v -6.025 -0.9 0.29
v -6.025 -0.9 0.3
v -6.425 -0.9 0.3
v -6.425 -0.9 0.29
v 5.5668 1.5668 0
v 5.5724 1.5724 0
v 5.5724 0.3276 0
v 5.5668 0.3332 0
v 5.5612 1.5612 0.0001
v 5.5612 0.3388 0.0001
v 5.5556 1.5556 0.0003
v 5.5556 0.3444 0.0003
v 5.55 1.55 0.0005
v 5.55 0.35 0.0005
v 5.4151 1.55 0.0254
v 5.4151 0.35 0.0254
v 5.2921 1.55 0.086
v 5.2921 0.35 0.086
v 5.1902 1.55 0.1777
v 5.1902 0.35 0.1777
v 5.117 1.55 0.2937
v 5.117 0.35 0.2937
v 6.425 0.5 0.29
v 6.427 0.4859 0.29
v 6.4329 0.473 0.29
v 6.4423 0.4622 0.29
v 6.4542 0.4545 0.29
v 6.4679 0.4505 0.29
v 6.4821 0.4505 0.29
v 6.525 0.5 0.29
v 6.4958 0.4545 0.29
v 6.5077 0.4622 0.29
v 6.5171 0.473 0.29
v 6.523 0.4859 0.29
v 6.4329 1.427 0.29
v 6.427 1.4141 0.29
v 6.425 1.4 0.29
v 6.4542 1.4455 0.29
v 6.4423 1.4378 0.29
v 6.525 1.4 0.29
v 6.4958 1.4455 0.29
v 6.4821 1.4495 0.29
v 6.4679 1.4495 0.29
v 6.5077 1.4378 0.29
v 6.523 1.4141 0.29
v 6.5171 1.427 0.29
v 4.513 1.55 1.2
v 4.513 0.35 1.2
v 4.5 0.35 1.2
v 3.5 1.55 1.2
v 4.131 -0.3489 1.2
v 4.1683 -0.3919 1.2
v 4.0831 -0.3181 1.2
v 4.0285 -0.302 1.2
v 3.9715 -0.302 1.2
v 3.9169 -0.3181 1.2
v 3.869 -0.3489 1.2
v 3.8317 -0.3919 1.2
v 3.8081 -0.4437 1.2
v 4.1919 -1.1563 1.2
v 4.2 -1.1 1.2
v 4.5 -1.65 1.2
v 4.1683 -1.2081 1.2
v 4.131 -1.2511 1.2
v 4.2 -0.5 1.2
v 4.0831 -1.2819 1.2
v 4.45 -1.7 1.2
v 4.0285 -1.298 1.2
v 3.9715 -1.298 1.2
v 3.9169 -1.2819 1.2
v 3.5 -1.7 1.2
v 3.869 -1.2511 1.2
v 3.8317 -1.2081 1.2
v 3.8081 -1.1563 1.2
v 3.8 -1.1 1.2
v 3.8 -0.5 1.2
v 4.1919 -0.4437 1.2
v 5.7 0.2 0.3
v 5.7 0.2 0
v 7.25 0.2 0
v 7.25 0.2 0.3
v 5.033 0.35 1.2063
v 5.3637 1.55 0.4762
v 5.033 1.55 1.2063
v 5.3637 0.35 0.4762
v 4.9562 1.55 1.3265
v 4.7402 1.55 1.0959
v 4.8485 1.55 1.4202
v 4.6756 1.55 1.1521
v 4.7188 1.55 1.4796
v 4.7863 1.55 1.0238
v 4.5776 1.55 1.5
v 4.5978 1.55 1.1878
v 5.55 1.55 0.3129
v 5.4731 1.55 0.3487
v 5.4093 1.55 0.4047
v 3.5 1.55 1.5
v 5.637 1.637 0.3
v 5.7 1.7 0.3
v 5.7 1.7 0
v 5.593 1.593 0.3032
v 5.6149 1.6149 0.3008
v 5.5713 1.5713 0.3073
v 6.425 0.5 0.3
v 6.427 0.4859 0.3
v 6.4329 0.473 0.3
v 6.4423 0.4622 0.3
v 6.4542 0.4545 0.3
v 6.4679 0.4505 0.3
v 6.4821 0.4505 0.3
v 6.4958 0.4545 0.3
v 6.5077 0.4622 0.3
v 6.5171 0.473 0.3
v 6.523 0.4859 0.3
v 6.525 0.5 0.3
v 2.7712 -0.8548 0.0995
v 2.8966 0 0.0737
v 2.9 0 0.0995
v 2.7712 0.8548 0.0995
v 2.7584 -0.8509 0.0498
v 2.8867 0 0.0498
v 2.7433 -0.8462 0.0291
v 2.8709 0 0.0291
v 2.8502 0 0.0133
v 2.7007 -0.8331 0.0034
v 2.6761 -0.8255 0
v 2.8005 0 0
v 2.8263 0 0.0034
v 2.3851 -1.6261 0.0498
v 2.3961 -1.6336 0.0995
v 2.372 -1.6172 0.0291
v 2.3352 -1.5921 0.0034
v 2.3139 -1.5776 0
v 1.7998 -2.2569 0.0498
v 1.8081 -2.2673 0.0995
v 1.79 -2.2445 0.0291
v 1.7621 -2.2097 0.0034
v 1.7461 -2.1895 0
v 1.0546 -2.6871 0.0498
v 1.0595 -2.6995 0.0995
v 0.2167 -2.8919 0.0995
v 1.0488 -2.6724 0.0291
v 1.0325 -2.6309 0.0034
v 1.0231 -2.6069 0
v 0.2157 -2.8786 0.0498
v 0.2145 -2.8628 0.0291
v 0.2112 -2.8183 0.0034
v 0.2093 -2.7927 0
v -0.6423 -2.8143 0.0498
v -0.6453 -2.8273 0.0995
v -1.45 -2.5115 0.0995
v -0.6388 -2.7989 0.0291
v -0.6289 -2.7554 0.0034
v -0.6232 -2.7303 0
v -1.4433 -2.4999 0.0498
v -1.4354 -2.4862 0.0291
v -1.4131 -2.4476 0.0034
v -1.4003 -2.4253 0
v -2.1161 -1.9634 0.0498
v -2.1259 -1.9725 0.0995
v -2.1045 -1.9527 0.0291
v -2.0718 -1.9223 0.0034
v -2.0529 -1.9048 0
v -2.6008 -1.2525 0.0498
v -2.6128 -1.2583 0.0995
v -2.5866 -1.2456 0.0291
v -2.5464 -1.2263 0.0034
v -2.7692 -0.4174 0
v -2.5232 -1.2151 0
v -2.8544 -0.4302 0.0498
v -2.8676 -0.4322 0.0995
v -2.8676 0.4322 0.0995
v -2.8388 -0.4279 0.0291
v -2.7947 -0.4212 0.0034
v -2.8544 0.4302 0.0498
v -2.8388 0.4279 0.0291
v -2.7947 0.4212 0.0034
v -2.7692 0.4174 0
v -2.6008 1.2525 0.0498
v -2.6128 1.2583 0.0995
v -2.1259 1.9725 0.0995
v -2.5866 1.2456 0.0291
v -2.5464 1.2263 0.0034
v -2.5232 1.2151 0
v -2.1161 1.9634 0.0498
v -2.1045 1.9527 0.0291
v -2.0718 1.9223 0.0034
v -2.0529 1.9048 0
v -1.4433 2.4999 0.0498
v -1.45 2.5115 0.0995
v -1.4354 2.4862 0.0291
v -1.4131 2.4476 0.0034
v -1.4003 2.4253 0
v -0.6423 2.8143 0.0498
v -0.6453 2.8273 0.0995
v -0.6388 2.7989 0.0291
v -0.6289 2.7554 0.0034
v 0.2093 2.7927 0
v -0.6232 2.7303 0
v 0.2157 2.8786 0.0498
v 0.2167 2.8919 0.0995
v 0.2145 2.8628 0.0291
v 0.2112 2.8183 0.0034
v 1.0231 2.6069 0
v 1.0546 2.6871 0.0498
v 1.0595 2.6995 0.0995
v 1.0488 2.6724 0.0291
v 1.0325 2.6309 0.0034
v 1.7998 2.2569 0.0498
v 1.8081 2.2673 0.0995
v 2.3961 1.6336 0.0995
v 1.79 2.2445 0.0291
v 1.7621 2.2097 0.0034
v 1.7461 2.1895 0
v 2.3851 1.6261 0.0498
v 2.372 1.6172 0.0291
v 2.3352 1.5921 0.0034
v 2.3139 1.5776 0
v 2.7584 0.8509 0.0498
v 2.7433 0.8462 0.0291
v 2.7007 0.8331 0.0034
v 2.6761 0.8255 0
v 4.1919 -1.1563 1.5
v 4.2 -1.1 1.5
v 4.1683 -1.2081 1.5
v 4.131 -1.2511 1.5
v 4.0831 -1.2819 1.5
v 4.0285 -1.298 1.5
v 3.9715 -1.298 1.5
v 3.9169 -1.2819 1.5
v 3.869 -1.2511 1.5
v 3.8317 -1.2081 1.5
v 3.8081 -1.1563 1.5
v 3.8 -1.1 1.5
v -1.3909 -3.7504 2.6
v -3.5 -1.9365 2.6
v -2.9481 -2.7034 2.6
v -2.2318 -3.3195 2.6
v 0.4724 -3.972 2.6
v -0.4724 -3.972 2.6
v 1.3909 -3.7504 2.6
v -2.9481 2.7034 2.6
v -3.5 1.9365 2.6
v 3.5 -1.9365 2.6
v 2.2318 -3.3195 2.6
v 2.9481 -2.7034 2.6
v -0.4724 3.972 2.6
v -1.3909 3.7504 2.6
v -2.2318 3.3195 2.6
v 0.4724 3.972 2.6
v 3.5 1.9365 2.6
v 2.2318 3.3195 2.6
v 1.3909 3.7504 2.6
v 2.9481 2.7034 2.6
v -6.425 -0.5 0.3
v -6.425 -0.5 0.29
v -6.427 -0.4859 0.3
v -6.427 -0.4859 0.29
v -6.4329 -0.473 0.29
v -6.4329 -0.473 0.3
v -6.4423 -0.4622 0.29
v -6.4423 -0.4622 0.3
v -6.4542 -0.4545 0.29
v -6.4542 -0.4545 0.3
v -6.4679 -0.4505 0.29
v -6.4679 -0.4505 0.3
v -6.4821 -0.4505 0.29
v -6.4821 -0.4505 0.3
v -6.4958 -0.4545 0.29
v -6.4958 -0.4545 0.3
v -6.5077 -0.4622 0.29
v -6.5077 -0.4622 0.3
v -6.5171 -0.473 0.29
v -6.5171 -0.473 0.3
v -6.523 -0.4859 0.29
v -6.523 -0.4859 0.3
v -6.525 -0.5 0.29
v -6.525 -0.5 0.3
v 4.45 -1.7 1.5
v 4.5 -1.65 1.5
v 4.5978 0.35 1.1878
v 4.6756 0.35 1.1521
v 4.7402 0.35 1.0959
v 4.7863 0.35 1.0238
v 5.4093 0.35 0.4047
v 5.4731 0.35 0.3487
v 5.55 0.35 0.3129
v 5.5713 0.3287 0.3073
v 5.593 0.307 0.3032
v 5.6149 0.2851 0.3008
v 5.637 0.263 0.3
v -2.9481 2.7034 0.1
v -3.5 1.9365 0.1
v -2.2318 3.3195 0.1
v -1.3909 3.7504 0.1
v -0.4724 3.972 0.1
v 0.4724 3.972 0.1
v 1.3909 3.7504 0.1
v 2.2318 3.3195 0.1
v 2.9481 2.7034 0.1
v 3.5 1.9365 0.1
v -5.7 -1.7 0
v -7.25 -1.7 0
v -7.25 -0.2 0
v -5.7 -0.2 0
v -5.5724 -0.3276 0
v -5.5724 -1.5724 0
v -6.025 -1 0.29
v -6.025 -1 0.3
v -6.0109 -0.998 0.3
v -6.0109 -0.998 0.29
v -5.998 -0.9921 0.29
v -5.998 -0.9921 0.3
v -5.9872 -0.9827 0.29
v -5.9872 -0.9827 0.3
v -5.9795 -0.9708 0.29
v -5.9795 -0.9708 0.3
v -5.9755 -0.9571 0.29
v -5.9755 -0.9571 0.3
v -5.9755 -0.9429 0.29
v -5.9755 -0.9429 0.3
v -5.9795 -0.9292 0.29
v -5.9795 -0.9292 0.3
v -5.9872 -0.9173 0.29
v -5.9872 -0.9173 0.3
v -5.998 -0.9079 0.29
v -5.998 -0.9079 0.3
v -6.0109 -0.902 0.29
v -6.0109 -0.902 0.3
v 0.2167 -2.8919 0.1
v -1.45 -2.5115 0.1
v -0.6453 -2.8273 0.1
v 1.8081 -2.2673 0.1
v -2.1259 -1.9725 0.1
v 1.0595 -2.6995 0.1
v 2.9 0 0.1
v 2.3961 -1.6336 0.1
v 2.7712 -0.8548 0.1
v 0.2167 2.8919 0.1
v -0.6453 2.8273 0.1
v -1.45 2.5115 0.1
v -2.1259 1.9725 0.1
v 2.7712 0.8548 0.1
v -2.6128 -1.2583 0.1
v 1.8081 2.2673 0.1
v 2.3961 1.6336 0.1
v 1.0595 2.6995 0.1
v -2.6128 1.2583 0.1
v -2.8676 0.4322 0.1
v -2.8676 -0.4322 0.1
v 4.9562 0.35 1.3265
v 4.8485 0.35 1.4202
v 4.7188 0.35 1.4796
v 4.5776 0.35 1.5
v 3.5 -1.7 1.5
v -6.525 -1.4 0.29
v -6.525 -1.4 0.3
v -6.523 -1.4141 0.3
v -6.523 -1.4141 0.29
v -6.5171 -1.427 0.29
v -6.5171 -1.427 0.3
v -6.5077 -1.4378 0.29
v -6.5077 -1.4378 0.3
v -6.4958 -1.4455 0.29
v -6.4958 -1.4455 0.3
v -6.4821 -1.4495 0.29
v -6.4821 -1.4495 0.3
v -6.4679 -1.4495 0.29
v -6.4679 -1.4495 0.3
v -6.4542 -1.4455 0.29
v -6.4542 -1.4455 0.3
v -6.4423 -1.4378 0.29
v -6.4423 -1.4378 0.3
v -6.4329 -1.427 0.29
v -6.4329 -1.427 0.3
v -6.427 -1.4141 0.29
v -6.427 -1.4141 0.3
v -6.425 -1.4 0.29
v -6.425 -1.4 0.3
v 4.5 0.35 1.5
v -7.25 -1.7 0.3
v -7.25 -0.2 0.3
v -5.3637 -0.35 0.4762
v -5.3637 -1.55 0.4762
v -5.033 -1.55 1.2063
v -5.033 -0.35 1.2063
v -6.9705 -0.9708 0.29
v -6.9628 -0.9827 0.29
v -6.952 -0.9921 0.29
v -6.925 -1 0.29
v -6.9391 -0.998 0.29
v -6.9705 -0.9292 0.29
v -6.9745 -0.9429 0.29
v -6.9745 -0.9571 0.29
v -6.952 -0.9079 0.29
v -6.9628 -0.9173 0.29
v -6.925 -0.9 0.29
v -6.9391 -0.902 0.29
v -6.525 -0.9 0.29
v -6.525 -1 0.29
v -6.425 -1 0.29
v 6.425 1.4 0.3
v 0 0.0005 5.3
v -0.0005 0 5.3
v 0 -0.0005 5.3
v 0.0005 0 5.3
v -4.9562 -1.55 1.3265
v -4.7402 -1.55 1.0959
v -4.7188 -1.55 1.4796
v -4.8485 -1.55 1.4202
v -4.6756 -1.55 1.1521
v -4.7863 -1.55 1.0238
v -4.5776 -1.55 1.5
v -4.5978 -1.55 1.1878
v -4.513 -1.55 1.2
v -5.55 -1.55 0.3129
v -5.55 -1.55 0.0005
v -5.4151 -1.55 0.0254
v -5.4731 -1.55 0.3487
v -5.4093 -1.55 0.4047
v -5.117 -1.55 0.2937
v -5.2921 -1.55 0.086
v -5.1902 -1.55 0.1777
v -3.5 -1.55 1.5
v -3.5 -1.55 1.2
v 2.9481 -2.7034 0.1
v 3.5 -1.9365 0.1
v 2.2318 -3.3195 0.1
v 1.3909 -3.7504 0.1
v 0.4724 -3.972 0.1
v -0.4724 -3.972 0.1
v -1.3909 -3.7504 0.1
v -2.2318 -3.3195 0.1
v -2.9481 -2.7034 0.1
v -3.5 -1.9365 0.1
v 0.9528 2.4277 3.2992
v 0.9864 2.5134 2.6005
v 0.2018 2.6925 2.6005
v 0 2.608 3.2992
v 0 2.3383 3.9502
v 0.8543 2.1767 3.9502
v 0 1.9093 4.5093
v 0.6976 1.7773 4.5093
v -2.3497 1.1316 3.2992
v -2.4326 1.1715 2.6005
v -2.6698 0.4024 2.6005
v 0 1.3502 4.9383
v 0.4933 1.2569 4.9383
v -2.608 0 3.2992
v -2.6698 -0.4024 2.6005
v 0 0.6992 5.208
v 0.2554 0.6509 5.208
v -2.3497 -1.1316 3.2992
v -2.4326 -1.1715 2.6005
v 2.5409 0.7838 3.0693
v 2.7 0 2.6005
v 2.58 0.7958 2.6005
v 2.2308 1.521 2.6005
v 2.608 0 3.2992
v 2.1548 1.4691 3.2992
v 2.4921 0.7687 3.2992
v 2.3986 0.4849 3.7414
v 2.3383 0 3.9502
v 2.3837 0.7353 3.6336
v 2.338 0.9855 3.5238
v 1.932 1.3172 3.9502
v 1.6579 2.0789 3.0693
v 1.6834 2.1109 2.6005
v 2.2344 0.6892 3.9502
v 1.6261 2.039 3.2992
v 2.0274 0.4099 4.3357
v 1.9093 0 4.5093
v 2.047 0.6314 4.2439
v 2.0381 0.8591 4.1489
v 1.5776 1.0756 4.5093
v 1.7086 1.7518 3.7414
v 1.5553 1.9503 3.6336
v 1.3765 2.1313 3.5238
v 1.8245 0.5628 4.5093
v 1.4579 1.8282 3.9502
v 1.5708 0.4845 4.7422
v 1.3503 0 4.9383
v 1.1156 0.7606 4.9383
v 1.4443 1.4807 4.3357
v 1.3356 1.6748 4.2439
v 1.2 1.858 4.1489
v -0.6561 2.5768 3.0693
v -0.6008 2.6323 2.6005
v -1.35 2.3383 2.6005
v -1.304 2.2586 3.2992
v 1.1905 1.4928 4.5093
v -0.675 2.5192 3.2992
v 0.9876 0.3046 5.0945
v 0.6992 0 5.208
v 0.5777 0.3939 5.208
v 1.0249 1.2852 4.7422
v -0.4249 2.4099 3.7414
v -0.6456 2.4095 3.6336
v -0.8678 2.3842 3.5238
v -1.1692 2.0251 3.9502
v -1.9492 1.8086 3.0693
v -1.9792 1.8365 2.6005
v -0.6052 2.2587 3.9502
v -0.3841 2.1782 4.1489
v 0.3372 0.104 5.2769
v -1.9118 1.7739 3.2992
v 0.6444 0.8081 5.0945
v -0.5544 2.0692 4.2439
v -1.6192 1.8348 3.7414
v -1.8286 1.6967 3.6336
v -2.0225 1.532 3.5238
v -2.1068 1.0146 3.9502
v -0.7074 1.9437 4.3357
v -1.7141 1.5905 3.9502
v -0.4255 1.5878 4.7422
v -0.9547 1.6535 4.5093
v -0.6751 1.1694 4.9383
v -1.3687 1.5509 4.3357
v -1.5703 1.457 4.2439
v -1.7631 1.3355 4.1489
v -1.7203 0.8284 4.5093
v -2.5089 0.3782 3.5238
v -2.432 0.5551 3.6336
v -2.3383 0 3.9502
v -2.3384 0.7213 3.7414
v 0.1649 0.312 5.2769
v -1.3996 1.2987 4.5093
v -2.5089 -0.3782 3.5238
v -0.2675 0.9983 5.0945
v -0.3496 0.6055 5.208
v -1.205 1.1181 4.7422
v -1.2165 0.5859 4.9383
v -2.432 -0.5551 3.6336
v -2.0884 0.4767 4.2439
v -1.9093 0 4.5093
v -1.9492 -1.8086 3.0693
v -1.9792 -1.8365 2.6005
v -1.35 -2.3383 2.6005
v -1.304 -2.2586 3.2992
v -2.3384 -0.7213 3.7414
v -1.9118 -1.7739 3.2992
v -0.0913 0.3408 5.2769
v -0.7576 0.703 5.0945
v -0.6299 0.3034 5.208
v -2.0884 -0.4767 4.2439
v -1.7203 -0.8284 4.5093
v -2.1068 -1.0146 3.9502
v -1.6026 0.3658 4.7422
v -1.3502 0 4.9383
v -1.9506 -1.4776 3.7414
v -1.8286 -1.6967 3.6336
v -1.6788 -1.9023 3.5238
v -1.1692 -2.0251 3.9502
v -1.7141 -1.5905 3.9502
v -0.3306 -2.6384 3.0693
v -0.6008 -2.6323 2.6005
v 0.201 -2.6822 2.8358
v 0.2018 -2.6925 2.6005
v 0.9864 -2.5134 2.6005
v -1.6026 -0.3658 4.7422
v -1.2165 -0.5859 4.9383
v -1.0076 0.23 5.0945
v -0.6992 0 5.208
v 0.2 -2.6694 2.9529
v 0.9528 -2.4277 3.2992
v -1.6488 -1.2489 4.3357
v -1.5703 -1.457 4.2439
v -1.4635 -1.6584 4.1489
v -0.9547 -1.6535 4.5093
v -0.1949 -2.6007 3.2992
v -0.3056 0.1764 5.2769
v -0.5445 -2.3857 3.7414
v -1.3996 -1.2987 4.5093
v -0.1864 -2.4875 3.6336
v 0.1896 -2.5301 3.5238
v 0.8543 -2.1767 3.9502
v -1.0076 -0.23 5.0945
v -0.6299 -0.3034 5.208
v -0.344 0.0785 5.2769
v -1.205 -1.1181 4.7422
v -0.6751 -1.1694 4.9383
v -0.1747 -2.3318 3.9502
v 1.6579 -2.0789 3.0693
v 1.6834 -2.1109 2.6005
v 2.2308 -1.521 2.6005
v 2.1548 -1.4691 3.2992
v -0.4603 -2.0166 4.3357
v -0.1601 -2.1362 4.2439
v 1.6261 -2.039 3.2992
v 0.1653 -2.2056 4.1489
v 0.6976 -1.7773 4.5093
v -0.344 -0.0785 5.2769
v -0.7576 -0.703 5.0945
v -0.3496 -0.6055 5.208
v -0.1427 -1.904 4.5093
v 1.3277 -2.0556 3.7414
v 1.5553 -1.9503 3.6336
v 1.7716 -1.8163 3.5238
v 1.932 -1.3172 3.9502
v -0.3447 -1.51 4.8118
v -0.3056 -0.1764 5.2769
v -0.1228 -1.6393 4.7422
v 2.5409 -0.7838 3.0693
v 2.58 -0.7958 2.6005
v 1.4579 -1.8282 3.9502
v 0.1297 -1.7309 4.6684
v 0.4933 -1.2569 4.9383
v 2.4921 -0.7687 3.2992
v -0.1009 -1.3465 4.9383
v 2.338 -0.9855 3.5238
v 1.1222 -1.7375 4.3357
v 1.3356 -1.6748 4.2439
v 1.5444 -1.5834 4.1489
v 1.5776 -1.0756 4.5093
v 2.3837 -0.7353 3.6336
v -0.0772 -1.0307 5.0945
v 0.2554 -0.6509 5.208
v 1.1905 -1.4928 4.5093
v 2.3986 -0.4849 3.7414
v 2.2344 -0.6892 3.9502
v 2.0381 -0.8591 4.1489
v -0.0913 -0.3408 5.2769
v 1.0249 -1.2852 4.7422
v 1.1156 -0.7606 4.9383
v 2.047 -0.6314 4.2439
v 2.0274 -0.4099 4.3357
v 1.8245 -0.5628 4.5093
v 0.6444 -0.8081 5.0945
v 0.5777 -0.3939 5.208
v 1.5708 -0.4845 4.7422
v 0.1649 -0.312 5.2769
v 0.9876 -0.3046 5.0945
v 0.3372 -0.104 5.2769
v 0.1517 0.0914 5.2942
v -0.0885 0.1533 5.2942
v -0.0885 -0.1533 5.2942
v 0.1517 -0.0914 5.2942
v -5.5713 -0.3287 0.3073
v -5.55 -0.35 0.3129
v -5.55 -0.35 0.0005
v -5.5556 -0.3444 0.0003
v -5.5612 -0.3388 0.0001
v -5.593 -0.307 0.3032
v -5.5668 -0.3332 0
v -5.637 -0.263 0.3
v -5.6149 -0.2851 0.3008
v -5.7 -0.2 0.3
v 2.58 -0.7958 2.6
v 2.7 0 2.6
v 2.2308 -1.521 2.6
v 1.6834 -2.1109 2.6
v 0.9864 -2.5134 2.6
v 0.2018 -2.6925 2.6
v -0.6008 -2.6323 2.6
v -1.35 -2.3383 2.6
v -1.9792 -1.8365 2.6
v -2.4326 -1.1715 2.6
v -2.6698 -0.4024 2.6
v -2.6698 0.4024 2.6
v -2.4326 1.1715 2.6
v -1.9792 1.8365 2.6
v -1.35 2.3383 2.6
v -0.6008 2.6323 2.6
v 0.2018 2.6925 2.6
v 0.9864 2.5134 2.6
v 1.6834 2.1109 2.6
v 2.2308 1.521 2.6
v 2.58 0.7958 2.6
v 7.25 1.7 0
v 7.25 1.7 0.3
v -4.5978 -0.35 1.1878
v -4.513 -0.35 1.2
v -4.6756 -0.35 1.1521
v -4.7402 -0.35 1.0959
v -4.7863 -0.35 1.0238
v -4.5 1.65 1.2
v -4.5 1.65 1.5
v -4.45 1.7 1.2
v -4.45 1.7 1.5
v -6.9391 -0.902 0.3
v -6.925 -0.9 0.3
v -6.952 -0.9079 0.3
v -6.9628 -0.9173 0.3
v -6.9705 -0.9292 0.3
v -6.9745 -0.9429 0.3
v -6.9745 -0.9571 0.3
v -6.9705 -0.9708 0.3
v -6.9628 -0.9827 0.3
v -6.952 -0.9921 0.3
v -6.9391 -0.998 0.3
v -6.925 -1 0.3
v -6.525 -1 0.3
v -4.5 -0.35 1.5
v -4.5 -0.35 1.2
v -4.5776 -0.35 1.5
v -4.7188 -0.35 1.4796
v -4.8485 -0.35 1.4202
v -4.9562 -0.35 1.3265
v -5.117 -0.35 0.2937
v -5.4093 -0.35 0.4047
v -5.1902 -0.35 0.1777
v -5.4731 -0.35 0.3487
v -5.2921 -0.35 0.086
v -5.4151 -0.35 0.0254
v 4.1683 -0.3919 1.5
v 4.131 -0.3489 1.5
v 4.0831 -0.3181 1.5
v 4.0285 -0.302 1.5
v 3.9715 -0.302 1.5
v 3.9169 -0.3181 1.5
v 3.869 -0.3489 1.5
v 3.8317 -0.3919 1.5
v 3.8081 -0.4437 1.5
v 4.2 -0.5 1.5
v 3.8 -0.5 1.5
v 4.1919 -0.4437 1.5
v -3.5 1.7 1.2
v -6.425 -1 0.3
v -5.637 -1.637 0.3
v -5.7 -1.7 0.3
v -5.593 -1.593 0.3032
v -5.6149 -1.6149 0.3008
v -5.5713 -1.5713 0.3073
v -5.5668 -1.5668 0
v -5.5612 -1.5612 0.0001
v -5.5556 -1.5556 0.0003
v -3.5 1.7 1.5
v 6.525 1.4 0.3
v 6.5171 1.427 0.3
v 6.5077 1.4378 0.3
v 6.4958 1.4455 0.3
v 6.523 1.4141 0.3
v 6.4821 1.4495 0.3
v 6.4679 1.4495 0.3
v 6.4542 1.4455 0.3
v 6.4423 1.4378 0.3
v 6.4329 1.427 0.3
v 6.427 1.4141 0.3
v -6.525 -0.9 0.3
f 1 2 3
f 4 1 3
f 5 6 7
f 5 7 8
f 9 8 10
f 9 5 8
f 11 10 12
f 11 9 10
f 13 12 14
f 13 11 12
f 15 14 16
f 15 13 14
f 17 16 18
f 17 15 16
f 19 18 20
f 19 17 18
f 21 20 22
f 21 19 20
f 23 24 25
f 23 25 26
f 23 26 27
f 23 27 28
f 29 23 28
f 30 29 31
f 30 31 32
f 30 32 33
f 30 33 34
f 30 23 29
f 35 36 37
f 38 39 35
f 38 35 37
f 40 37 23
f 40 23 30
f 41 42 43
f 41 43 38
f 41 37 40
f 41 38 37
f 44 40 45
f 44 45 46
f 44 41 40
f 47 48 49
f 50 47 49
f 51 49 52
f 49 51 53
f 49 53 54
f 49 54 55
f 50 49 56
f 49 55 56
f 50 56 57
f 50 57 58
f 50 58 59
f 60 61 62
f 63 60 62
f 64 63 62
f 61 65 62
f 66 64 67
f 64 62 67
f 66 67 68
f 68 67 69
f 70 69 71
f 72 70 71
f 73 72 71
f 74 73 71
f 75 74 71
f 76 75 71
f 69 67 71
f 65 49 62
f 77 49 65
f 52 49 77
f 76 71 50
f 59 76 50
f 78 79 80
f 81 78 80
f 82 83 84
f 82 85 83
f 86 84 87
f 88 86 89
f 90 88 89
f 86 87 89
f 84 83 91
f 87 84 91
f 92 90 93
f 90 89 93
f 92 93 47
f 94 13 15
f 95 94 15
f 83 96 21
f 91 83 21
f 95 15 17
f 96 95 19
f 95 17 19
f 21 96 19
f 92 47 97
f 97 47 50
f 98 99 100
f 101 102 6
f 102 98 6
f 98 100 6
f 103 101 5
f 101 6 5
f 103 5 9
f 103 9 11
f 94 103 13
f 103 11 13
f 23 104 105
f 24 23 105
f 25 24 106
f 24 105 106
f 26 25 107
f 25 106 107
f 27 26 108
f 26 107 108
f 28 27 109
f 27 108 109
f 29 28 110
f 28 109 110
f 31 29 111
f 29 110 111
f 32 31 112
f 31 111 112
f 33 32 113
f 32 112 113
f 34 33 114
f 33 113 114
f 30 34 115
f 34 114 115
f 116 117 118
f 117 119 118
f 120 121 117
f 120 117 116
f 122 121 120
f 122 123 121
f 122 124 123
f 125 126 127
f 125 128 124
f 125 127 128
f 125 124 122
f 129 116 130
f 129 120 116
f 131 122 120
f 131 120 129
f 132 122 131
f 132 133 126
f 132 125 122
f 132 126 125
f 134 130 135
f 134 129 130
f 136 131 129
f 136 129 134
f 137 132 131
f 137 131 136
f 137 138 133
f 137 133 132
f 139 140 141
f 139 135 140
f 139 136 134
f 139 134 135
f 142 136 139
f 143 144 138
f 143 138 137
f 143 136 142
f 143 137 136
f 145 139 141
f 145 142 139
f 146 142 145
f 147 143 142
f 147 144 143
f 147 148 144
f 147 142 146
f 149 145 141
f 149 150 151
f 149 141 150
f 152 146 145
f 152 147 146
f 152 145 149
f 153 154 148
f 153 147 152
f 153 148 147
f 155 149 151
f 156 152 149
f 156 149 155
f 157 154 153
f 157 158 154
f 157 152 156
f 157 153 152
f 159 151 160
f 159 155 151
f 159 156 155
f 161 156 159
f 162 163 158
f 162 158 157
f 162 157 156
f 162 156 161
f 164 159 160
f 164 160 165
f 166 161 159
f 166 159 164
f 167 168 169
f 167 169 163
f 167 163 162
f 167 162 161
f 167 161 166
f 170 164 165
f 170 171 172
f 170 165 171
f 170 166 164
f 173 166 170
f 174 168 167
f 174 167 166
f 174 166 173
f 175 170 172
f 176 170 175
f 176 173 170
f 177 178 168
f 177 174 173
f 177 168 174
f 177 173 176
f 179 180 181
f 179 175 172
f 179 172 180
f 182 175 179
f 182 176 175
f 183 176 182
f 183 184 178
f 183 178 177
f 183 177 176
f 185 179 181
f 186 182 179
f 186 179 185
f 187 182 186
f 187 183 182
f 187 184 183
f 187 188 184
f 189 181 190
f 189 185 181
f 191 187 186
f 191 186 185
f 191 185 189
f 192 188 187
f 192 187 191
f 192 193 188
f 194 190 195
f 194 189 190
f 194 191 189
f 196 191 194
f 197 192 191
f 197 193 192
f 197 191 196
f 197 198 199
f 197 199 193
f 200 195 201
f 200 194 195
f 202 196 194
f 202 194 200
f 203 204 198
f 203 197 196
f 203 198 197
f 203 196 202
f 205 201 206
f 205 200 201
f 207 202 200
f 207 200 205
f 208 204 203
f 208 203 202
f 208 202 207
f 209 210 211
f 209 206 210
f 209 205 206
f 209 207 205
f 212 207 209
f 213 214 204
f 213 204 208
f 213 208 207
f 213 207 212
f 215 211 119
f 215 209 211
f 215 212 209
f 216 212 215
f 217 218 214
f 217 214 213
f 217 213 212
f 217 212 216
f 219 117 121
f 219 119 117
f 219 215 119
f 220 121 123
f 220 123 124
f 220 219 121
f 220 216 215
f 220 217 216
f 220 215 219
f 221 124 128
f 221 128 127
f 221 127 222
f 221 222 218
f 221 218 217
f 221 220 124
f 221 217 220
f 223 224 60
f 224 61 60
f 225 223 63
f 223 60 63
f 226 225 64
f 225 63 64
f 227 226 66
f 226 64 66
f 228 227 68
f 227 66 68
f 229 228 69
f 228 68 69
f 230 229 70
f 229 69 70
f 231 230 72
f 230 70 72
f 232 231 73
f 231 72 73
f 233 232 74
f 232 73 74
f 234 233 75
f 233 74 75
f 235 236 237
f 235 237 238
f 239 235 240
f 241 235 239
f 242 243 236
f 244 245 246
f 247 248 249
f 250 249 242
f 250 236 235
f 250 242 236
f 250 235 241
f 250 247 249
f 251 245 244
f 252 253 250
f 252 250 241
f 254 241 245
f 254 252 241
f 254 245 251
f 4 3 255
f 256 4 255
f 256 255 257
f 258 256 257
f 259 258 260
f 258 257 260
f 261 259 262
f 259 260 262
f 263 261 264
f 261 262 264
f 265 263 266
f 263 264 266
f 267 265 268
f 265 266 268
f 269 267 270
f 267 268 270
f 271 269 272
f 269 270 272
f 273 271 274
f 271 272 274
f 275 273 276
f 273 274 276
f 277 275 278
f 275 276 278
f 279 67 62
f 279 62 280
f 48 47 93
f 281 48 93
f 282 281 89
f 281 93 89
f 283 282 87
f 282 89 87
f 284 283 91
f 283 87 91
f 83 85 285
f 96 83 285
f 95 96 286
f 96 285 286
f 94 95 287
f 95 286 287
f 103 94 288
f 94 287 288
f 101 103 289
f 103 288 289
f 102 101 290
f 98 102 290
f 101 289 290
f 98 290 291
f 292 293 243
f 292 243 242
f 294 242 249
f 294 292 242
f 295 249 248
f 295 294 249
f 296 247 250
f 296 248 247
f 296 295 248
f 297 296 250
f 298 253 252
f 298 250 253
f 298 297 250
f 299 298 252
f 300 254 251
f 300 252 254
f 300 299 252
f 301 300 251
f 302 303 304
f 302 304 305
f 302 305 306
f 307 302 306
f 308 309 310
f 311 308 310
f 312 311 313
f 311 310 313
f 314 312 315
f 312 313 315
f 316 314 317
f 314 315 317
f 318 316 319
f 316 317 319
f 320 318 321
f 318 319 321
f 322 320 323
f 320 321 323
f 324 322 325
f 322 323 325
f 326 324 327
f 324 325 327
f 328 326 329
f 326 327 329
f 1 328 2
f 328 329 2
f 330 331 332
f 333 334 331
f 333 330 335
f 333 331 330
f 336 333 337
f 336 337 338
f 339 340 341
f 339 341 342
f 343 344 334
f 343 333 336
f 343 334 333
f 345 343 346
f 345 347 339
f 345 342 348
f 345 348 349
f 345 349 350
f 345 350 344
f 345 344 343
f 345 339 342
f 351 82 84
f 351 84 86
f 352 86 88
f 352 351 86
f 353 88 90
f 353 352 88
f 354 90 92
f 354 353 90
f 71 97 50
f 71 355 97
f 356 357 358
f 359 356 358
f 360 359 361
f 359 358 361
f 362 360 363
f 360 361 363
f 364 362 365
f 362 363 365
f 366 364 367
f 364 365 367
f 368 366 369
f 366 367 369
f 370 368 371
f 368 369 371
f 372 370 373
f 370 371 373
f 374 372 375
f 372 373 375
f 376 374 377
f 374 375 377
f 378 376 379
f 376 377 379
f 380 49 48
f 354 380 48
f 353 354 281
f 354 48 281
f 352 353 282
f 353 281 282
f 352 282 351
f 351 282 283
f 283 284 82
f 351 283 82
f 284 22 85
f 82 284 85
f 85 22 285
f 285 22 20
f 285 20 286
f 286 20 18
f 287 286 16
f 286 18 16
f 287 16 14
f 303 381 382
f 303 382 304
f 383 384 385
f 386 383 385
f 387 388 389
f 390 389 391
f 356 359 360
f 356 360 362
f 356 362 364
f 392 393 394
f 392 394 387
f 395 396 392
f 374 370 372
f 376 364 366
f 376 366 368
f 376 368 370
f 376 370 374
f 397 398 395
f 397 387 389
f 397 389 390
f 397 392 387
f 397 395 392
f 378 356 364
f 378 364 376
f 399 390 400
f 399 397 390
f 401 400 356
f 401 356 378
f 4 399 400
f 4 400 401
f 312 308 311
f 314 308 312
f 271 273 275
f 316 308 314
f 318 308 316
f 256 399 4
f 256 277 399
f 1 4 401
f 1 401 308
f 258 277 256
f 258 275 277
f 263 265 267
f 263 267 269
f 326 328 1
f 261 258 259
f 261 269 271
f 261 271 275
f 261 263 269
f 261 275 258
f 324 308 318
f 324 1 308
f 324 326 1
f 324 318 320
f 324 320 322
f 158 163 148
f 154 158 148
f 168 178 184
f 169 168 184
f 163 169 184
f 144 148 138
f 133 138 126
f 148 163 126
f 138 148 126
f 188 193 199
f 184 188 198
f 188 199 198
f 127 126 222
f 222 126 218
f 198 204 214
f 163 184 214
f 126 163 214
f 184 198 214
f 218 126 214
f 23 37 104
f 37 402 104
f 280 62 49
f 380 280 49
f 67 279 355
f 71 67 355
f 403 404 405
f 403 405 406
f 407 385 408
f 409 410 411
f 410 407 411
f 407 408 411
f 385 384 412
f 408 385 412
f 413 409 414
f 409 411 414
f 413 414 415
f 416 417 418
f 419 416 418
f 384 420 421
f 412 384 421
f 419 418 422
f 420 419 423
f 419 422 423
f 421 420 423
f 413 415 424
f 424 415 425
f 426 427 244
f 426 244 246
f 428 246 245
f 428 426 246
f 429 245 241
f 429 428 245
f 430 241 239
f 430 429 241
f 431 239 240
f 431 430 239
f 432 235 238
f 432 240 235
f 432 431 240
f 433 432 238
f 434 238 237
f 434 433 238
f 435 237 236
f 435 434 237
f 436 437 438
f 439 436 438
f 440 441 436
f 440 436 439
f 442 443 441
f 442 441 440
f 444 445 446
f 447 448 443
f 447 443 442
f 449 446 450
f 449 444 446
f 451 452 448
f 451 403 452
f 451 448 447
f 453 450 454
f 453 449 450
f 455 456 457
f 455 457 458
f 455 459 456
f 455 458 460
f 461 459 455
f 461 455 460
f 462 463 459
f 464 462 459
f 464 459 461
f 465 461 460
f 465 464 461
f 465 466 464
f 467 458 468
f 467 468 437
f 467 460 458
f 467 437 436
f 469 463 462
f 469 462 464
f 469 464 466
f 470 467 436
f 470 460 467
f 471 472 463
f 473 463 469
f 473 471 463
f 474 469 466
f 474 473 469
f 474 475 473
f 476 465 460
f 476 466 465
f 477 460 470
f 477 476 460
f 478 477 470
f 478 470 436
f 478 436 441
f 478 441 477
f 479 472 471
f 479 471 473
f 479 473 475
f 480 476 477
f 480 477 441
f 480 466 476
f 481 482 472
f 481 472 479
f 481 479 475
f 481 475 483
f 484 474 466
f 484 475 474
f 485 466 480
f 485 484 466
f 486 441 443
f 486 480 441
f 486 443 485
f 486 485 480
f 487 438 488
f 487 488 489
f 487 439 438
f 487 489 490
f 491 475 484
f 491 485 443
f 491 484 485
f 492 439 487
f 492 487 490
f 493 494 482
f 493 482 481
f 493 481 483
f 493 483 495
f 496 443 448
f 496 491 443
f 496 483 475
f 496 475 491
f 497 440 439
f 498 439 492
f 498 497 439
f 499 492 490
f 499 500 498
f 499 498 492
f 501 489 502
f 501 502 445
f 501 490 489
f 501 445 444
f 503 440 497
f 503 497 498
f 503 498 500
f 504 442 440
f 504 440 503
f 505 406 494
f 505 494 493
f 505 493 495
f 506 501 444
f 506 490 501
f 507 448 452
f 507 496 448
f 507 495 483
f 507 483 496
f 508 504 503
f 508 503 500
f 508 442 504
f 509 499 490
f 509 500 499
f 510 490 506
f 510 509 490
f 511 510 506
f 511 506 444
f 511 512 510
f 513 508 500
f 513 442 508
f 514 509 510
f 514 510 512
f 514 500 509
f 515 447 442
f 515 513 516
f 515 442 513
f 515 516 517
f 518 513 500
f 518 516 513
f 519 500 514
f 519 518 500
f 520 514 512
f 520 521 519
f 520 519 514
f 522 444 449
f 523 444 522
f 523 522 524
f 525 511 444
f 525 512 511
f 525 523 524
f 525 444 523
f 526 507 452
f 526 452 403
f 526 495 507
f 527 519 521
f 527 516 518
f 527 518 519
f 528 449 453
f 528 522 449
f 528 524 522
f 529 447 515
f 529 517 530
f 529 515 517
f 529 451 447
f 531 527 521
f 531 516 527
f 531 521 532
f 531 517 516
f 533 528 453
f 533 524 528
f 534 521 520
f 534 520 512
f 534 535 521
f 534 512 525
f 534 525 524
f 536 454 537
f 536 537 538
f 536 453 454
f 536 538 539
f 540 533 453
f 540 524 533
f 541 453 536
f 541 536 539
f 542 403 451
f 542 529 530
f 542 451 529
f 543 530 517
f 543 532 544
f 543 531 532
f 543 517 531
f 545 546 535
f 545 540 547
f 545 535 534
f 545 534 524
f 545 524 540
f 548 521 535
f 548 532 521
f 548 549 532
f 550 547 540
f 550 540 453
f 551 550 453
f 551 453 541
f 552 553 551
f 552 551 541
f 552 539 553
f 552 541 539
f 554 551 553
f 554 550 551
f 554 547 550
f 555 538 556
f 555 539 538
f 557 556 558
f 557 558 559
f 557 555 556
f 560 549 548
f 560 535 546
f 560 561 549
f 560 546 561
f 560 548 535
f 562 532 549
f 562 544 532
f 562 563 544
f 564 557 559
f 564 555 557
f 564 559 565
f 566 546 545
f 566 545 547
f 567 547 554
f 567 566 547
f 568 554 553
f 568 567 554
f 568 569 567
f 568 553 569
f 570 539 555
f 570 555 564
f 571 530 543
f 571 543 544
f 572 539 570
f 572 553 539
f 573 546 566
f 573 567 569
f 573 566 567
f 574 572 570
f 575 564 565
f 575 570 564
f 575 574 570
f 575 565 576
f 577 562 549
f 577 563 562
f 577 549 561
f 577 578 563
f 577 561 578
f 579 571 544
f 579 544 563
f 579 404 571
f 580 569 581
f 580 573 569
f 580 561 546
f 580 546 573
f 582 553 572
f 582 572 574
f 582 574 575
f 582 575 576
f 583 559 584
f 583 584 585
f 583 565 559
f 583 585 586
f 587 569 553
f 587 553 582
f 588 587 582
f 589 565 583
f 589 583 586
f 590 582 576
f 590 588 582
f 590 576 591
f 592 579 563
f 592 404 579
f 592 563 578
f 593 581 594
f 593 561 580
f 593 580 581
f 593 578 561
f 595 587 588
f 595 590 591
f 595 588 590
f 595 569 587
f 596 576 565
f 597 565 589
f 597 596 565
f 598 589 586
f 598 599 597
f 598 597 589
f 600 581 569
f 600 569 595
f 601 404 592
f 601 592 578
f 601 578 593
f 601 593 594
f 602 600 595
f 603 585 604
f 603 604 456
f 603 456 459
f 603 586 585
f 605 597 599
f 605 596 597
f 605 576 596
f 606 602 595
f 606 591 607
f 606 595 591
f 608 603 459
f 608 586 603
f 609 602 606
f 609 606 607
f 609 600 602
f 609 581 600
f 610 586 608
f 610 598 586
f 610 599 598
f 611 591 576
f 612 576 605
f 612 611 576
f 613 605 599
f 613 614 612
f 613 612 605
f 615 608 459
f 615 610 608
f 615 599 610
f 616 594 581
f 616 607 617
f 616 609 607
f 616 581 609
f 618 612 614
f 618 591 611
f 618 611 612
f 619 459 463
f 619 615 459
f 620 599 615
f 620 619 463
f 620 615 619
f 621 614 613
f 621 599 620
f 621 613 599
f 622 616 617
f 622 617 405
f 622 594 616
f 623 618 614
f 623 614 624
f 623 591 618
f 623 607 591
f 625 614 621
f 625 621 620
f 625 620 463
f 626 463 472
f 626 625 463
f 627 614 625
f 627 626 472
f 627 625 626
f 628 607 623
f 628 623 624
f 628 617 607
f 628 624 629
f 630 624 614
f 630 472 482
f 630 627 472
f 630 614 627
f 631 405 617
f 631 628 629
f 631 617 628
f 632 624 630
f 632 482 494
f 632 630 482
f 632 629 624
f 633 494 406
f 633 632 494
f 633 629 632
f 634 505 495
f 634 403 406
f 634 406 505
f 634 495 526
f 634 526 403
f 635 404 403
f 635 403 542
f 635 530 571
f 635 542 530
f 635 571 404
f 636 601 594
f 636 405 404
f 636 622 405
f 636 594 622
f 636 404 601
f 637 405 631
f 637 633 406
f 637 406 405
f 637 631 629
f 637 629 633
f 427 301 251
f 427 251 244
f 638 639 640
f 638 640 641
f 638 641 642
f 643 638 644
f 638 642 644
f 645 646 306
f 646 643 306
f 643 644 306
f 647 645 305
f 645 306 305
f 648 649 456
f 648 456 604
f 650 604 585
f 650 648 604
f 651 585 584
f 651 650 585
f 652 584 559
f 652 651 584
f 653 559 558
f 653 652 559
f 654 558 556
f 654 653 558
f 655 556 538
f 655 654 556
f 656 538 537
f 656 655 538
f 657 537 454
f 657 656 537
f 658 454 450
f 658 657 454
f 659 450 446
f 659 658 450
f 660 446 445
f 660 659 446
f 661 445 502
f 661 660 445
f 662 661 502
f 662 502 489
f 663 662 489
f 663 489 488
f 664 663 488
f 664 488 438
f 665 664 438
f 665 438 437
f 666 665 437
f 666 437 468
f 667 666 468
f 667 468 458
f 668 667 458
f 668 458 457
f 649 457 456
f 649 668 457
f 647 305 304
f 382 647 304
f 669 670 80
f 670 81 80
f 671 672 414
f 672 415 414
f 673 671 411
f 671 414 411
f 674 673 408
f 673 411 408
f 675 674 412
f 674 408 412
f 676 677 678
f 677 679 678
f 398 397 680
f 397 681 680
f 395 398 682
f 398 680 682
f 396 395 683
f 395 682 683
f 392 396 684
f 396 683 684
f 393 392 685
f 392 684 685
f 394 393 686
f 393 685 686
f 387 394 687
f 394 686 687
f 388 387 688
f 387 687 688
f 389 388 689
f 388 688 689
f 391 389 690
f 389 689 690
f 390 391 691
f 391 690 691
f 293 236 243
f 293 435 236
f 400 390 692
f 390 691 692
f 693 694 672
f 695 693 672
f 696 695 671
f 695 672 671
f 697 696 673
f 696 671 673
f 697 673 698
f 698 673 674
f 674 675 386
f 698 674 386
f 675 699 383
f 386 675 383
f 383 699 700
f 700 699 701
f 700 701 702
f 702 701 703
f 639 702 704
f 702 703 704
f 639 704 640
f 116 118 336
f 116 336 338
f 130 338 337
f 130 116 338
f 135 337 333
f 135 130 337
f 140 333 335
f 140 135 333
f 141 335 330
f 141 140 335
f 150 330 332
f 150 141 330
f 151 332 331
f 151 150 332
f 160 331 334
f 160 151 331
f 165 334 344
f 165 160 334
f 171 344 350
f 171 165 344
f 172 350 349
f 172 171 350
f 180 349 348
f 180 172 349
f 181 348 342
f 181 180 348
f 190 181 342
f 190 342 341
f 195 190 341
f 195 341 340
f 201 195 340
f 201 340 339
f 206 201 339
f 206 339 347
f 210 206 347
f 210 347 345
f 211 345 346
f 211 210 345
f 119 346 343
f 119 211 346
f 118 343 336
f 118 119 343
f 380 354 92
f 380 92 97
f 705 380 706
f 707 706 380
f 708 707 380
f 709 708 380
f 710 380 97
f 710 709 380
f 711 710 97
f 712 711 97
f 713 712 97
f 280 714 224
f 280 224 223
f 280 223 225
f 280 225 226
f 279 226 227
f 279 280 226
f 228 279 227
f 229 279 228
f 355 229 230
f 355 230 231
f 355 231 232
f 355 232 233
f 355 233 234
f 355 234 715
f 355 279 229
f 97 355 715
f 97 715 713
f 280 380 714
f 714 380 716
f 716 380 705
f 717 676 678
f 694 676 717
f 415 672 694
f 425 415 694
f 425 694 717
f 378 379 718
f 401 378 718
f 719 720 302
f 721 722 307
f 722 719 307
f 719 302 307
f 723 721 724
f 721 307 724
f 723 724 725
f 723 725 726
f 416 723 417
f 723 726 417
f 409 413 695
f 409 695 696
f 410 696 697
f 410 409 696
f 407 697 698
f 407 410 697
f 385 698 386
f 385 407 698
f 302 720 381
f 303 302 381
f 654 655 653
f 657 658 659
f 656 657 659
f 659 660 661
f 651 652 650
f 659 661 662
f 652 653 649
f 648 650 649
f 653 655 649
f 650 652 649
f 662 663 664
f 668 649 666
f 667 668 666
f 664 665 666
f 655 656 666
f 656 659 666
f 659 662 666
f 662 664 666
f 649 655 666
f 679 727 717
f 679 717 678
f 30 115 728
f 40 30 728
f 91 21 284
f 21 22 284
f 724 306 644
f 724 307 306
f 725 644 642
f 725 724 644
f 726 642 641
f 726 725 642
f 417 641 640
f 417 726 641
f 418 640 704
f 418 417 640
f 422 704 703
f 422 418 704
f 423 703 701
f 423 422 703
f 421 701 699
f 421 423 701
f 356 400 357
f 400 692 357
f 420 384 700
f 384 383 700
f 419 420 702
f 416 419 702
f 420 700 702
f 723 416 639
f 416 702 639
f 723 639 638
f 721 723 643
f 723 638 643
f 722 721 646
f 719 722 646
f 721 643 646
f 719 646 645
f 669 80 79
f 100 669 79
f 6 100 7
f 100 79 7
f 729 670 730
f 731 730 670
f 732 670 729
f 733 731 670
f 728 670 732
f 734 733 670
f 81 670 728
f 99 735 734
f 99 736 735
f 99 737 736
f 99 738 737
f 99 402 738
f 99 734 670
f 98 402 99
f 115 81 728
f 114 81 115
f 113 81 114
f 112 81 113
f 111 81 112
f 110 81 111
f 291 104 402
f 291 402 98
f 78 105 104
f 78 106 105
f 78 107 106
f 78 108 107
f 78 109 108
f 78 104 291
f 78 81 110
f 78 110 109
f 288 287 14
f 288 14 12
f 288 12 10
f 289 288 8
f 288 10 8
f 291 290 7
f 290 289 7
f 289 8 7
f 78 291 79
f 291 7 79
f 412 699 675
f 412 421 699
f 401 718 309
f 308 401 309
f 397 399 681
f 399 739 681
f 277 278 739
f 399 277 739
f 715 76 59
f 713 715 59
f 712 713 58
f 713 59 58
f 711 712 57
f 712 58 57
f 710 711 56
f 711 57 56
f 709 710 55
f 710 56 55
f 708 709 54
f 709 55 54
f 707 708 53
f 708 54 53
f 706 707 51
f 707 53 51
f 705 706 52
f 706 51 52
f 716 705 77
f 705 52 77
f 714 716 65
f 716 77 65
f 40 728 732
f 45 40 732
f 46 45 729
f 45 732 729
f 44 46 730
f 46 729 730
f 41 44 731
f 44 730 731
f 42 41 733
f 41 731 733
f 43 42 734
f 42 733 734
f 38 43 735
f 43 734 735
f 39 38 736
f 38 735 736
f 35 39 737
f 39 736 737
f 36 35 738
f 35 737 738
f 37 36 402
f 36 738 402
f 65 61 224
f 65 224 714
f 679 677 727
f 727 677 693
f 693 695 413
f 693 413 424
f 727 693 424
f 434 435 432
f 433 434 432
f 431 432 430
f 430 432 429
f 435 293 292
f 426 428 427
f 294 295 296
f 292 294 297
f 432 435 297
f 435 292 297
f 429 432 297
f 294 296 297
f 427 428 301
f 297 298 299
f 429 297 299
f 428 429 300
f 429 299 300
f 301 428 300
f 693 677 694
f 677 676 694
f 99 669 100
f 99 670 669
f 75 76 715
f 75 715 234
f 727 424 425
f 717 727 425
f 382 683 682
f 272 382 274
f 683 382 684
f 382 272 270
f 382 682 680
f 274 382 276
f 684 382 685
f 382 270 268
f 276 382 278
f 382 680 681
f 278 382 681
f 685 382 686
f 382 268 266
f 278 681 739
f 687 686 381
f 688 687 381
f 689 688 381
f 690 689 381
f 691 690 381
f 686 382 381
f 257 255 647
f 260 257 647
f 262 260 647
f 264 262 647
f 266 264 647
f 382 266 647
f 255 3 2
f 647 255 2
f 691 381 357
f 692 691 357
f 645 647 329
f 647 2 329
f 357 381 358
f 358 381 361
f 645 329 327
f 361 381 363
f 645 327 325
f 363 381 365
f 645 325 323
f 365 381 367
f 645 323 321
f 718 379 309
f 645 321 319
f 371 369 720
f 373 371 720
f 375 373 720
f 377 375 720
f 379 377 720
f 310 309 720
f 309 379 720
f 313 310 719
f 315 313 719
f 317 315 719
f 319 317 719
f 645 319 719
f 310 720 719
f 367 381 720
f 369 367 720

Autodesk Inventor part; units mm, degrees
ref_plane "YZ Plane" through (0, 0, 0) normal (1, 0, 0) x (0, 1, 0)
ref_plane "XZ Plane" through (0, 0, 0) normal (0, 1, 0) x (-1, 0, 0)
ref_plane "XY Plane" through (0, 0, 0) normal (0, 0, 1) x (1, 0, 0)
sketch "Sketch1" plane through (0, 0, 0) normal (0, 0, 1) x (1, 0, 0)
  circle A0 centre (0, 0) radius 2.9
  dimension "d0" = 5.8
extrude "Extrusion1" add sketch "Sketch1" along normal blind 0.1
sketch "Sketch2" plane through (0, 0, 0.1) normal (0, 0, 1) x (1, 0, 0)
  circle A0 centre (0, 0) radius 4
  line L0 (-3.5, 1.9365) -> (3.5, 1.9365)
  line L1 (3.5, 1.9365) -> (3.5, -1.9365)
  line L2 (3.5, -1.9365) -> (-3.5, -1.9365)
  line L3 (-3.5, -1.9365) -> (-3.5, 1.9365)
  point P0 (-3.5, -1.9365)
  dimension "d3" = 8
  dimension "d4" = 7
extrude "Extrusion2" add sketch "Sketch2" along normal blind 2.5 separate body contours L0 A0 | L1 L2 L3 L0 | A0 L2
fillet "Fillet1" radius 0.1 1 edges at (-2.9, 0, 0)
sketch "Sketch3" plane through (0, 0, 2.6) normal (0, 0, 1) x (1, 0, 0)
  circle A0 centre (0, 0) radius 2.7
  dimension "d8" = 5.4
extrude "Extrusion3" add sketch "Sketch3" along normal blind 2.7 separate body
fillet "Fillet2" radius 2.7 1 edges at (-2.7, 0, 5.3)
sketch "Sketch4" plane through (0, 0, 0) normal (0, 1, 0) x (-1, 0, 0)
  line L0 (7.25, 0) -> (5.25, 0)
  line L1 (5.25, 0) -> (4.7065, 1.2)
  line L2 (4.7065, 1.2) -> (3.5, 1.2)
  line L3 (7.25, 0.3) -> (5.4435, 0.3)
  line L4 (5.4435, 0.3) -> (4.9, 1.5)
  line L5 (4.9, 1.5) -> (3.5, 1.5)
  line L6 (7.25, 0.3) -> (7.25, 0)
  line L7 (3.5, 1.5) -> (3.5, 1.2)
  line L8 (0, 0) -> (0, 5.7322) construction
  line L9 (-7.25, 0) -> (-5.25, 0)
  line L10 (-5.25, 0) -> (-4.7065, 1.2)
  line L11 (-4.7065, 1.2) -> (-3.5, 1.2)
  line L12 (-7.25, 0.3) -> (-5.4435, 0.3)
  line L13 (-5.4435, 0.3) -> (-4.9, 1.5)
  line L14 (-4.9, 1.5) -> (-3.5, 1.5)
  line L15 (-7.25, 0.3) -> (-7.25, 0)
  line L16 (-3.5, 1.5) -> (-3.5, 1.2)
  dimension "d12" = 0.3
  dimension "d14" = 0.3
  dimension "d16" = 0.3
  dimension "d17" = 3.5
  dimension "d18" = 1.5
  dimension "d20" = 2
  dimension "d21" = 1.4
  dimension "d29" = 14.5
extrude "Extrusion4" add sketch "Sketch4" along normal mid plane 3.4 separate body
fillet "Fillet3" radius 0.3 4 edges at (-4.7065, 0, 1.2) (-5.4435, 0, 0.3) (4.7065, 0, 1.2) (5.4435, 0, 0.3)
fillet "Fillet4" radius 0.5 4 edges at (-4.9, 0, 1.5) (-5.25, 0, 0) (4.9, 0, 1.5) (5.25, 0, 0)
sketch "Sketch5" plane through (-7.25, -1.7, 0) normal (0, 0, -1) x (-1, 0, 0)
  line L0 (-2.75, 3.4) -> (-2.75, 1.35)
  line L1 (-2.75, 1.35) -> (-1.7, 1.35)
  line L2 (-1.7, 1.35) -> (-1.55, 1.5)
  line L3 (-1.55, 1.5) -> (0, 1.5)
  line L4 (0, 1.5) -> (0, 0)
  line L5 (0, 0) -> (-1.55, 0)
  line L6 (-1.55, 0) -> (-1.7, 0.15)
  line L7 (-1.7, 0.15) -> (-3.75, 0.15)
  line L8 (-1.7, 1.35) -> (-1.7, 0.15) construction
  line L9 (-2.75, 3.4) -> (-3.75, 3.4)
  line L10 (-14.5, 3.4) -> (-12.95, 3.4)
  line L11 (-12.95, 3.4) -> (-12.8, 3.25)
  line L12 (-12.8, 3.25) -> (-10.75, 3.25)
  line L13 (-10.75, 0) -> (-11.75, 0)
  line L14 (-11.75, 0) -> (-11.75, 2.05)
  line L15 (-11.75, 2.05) -> (-12.8, 2.05)
  line L16 (-12.8, 2.05) -> (-12.95, 1.9)
  line L17 (-12.95, 1.9) -> (-14.5, 1.9)
  line L18 (-14.5, 1.9) -> (-14.5, 3.4)
  line L19 (-3.75, 3.4) -> (-3.75, 0.15)
  line L20 (-10.75, 3.25) -> (-10.75, 0)
  line L21 (0, 0) -> (-14.5, 0)
  line L22 (-14.5, 0) -> (-14.5, 3.4)
  line L23 (-14.5, 3.4) -> (0, 3.4)
  line L24 (0, 3.4) -> (0, 0)
  line L25 (-11.25, 1.2) -> (-11.25, 0.6) construction
  line L26 (-11.05, 1.2) -> (-11.05, 0.6)
  line L27 (-11.45, 0.6) -> (-11.45, 1.2)
  arc A0 (-11.05, 1.2) -> (-11.45, 1.2) centre (-11.25, 1.2) ccw
  arc A1 (-11.45, 0.6) -> (-11.05, 0.6) centre (-11.25, 0.6) ccw
  point P0 (-1.7, 0.75)
  point P1 (0, 0.75)
  point P2 (-11.25, 0.9)
  point P3 (-11.25, 0)
  point P4 (-3.75, 3.4)
  point P5 (-10.75, 0)
  point P6 (0, 1.5)
  point P7 (-2.75, 3.4)
  point P8 (-11.75, 0)
  dimension "d31" = 1.5
  dimension "d32" = 1.2
  dimension "d33" = 135
  dimension "d34" = 1.7
  dimension "d35" = 1
  dimension "d36" = 3.4
  dimension "d37" = 3.75
  dimension "d38" = 7
  dimension "d39" = 1
  dimension "d41" = 0.4
  dimension "d42" = 0.6
extrude "Extrusion5" cut sketch "Sketch5" against normal through all contours L23 L24 L3 L2 L1 L0 | L19 L7 L6 L21 L20 L12 L11 L23 | L17 L16 L15 L14 L21 L22 | L26 A1 L27 A0 bodies 4
sketch "Sketch6" plane through (-7.25, -0.2, 0.3) normal (0, 0, 1) x (1, 0, 0)
  line L0 (0.775, -0.3) -> (0.775, -1.2) construction
  line L1 (0.725, -0.3) -> (0.725, -1.2)
  line L2 (0.825, -1.2) -> (0.825, -0.3)
  arc A0 (0.825, -0.3) -> (0.725, -0.3) centre (0.775, -0.3) ccw
  arc A1 (0.725, -1.2) -> (0.825, -1.2) centre (0.775, -1.2) ccw
  line L3 (0, -1.5) -> (0, 0) projected
  line L4 (0.325, -0.75) -> (1.225, -0.75) construction
  line L5 (0.325, -0.8) -> (1.225, -0.8)
  line L6 (1.225, -0.7) -> (0.325, -0.7)
  arc A2 (0.325, -0.7) -> (0.325, -0.8) centre (0.325, -0.75) ccw
  arc A3 (1.225, -0.8) -> (1.225, -0.7) centre (1.225, -0.75) ccw
  line L7 (1.55, 0) -> (0, 0) projected
  line L8 (13.725, 1.6) -> (13.725, 0.7) construction
  line L9 (13.675, 1.6) -> (13.675, 0.7)
  line L10 (13.775, 0.7) -> (13.775, 1.6)
  arc A4 (13.775, 1.6) -> (13.675, 1.6) centre (13.725, 1.6) ccw
  arc A5 (13.675, 0.7) -> (13.775, 0.7) centre (13.725, 0.7) ccw
  line L11 (14.5, 0.4) -> (14.5, 1.9) projected
  line L12 (12.95, 1.9) -> (14.5, 1.9) projected
  point P0 (7.25, 0.2)
  point P1 (0.775, -0.75)
  point P2 (0, -0.75)
  point P3 (0.775, -0.75)
  point P4 (0.775, 0)
  point P5 (13.725, 1.15)
  point P6 (14.5, 1.15)
  point P7 (13.725, 1.9)
  point P8 (0.825, -0.7)
  point P9 (0.725, -0.7)
  point P10 (0.725, -0.8)
  point P11 (0.825, -0.8)
  dimension "d45" = 0.1
  dimension "d46" = 1
  dimension "d47" = 0.1
  dimension "d48" = 1
  dimension "d49" = 0.1
  dimension "d50" = 1
extrude "Extrusion6" cut sketch "Sketch6" against normal blind 0.01 bodies 4
chamfer "Chamfer1" distance 0.05 angle 45 2 edges at (-4.5, 1.7, 1.35) (4.5, -1.7, 1.35)
equation "\"d14\" = d12"
equation "\"d16\" = d12"
equation "\"d47\" = d45"
equation "\"d48\" = d46"
equation "\"d49\" = d45"
equation "\"d50\" = d46"
